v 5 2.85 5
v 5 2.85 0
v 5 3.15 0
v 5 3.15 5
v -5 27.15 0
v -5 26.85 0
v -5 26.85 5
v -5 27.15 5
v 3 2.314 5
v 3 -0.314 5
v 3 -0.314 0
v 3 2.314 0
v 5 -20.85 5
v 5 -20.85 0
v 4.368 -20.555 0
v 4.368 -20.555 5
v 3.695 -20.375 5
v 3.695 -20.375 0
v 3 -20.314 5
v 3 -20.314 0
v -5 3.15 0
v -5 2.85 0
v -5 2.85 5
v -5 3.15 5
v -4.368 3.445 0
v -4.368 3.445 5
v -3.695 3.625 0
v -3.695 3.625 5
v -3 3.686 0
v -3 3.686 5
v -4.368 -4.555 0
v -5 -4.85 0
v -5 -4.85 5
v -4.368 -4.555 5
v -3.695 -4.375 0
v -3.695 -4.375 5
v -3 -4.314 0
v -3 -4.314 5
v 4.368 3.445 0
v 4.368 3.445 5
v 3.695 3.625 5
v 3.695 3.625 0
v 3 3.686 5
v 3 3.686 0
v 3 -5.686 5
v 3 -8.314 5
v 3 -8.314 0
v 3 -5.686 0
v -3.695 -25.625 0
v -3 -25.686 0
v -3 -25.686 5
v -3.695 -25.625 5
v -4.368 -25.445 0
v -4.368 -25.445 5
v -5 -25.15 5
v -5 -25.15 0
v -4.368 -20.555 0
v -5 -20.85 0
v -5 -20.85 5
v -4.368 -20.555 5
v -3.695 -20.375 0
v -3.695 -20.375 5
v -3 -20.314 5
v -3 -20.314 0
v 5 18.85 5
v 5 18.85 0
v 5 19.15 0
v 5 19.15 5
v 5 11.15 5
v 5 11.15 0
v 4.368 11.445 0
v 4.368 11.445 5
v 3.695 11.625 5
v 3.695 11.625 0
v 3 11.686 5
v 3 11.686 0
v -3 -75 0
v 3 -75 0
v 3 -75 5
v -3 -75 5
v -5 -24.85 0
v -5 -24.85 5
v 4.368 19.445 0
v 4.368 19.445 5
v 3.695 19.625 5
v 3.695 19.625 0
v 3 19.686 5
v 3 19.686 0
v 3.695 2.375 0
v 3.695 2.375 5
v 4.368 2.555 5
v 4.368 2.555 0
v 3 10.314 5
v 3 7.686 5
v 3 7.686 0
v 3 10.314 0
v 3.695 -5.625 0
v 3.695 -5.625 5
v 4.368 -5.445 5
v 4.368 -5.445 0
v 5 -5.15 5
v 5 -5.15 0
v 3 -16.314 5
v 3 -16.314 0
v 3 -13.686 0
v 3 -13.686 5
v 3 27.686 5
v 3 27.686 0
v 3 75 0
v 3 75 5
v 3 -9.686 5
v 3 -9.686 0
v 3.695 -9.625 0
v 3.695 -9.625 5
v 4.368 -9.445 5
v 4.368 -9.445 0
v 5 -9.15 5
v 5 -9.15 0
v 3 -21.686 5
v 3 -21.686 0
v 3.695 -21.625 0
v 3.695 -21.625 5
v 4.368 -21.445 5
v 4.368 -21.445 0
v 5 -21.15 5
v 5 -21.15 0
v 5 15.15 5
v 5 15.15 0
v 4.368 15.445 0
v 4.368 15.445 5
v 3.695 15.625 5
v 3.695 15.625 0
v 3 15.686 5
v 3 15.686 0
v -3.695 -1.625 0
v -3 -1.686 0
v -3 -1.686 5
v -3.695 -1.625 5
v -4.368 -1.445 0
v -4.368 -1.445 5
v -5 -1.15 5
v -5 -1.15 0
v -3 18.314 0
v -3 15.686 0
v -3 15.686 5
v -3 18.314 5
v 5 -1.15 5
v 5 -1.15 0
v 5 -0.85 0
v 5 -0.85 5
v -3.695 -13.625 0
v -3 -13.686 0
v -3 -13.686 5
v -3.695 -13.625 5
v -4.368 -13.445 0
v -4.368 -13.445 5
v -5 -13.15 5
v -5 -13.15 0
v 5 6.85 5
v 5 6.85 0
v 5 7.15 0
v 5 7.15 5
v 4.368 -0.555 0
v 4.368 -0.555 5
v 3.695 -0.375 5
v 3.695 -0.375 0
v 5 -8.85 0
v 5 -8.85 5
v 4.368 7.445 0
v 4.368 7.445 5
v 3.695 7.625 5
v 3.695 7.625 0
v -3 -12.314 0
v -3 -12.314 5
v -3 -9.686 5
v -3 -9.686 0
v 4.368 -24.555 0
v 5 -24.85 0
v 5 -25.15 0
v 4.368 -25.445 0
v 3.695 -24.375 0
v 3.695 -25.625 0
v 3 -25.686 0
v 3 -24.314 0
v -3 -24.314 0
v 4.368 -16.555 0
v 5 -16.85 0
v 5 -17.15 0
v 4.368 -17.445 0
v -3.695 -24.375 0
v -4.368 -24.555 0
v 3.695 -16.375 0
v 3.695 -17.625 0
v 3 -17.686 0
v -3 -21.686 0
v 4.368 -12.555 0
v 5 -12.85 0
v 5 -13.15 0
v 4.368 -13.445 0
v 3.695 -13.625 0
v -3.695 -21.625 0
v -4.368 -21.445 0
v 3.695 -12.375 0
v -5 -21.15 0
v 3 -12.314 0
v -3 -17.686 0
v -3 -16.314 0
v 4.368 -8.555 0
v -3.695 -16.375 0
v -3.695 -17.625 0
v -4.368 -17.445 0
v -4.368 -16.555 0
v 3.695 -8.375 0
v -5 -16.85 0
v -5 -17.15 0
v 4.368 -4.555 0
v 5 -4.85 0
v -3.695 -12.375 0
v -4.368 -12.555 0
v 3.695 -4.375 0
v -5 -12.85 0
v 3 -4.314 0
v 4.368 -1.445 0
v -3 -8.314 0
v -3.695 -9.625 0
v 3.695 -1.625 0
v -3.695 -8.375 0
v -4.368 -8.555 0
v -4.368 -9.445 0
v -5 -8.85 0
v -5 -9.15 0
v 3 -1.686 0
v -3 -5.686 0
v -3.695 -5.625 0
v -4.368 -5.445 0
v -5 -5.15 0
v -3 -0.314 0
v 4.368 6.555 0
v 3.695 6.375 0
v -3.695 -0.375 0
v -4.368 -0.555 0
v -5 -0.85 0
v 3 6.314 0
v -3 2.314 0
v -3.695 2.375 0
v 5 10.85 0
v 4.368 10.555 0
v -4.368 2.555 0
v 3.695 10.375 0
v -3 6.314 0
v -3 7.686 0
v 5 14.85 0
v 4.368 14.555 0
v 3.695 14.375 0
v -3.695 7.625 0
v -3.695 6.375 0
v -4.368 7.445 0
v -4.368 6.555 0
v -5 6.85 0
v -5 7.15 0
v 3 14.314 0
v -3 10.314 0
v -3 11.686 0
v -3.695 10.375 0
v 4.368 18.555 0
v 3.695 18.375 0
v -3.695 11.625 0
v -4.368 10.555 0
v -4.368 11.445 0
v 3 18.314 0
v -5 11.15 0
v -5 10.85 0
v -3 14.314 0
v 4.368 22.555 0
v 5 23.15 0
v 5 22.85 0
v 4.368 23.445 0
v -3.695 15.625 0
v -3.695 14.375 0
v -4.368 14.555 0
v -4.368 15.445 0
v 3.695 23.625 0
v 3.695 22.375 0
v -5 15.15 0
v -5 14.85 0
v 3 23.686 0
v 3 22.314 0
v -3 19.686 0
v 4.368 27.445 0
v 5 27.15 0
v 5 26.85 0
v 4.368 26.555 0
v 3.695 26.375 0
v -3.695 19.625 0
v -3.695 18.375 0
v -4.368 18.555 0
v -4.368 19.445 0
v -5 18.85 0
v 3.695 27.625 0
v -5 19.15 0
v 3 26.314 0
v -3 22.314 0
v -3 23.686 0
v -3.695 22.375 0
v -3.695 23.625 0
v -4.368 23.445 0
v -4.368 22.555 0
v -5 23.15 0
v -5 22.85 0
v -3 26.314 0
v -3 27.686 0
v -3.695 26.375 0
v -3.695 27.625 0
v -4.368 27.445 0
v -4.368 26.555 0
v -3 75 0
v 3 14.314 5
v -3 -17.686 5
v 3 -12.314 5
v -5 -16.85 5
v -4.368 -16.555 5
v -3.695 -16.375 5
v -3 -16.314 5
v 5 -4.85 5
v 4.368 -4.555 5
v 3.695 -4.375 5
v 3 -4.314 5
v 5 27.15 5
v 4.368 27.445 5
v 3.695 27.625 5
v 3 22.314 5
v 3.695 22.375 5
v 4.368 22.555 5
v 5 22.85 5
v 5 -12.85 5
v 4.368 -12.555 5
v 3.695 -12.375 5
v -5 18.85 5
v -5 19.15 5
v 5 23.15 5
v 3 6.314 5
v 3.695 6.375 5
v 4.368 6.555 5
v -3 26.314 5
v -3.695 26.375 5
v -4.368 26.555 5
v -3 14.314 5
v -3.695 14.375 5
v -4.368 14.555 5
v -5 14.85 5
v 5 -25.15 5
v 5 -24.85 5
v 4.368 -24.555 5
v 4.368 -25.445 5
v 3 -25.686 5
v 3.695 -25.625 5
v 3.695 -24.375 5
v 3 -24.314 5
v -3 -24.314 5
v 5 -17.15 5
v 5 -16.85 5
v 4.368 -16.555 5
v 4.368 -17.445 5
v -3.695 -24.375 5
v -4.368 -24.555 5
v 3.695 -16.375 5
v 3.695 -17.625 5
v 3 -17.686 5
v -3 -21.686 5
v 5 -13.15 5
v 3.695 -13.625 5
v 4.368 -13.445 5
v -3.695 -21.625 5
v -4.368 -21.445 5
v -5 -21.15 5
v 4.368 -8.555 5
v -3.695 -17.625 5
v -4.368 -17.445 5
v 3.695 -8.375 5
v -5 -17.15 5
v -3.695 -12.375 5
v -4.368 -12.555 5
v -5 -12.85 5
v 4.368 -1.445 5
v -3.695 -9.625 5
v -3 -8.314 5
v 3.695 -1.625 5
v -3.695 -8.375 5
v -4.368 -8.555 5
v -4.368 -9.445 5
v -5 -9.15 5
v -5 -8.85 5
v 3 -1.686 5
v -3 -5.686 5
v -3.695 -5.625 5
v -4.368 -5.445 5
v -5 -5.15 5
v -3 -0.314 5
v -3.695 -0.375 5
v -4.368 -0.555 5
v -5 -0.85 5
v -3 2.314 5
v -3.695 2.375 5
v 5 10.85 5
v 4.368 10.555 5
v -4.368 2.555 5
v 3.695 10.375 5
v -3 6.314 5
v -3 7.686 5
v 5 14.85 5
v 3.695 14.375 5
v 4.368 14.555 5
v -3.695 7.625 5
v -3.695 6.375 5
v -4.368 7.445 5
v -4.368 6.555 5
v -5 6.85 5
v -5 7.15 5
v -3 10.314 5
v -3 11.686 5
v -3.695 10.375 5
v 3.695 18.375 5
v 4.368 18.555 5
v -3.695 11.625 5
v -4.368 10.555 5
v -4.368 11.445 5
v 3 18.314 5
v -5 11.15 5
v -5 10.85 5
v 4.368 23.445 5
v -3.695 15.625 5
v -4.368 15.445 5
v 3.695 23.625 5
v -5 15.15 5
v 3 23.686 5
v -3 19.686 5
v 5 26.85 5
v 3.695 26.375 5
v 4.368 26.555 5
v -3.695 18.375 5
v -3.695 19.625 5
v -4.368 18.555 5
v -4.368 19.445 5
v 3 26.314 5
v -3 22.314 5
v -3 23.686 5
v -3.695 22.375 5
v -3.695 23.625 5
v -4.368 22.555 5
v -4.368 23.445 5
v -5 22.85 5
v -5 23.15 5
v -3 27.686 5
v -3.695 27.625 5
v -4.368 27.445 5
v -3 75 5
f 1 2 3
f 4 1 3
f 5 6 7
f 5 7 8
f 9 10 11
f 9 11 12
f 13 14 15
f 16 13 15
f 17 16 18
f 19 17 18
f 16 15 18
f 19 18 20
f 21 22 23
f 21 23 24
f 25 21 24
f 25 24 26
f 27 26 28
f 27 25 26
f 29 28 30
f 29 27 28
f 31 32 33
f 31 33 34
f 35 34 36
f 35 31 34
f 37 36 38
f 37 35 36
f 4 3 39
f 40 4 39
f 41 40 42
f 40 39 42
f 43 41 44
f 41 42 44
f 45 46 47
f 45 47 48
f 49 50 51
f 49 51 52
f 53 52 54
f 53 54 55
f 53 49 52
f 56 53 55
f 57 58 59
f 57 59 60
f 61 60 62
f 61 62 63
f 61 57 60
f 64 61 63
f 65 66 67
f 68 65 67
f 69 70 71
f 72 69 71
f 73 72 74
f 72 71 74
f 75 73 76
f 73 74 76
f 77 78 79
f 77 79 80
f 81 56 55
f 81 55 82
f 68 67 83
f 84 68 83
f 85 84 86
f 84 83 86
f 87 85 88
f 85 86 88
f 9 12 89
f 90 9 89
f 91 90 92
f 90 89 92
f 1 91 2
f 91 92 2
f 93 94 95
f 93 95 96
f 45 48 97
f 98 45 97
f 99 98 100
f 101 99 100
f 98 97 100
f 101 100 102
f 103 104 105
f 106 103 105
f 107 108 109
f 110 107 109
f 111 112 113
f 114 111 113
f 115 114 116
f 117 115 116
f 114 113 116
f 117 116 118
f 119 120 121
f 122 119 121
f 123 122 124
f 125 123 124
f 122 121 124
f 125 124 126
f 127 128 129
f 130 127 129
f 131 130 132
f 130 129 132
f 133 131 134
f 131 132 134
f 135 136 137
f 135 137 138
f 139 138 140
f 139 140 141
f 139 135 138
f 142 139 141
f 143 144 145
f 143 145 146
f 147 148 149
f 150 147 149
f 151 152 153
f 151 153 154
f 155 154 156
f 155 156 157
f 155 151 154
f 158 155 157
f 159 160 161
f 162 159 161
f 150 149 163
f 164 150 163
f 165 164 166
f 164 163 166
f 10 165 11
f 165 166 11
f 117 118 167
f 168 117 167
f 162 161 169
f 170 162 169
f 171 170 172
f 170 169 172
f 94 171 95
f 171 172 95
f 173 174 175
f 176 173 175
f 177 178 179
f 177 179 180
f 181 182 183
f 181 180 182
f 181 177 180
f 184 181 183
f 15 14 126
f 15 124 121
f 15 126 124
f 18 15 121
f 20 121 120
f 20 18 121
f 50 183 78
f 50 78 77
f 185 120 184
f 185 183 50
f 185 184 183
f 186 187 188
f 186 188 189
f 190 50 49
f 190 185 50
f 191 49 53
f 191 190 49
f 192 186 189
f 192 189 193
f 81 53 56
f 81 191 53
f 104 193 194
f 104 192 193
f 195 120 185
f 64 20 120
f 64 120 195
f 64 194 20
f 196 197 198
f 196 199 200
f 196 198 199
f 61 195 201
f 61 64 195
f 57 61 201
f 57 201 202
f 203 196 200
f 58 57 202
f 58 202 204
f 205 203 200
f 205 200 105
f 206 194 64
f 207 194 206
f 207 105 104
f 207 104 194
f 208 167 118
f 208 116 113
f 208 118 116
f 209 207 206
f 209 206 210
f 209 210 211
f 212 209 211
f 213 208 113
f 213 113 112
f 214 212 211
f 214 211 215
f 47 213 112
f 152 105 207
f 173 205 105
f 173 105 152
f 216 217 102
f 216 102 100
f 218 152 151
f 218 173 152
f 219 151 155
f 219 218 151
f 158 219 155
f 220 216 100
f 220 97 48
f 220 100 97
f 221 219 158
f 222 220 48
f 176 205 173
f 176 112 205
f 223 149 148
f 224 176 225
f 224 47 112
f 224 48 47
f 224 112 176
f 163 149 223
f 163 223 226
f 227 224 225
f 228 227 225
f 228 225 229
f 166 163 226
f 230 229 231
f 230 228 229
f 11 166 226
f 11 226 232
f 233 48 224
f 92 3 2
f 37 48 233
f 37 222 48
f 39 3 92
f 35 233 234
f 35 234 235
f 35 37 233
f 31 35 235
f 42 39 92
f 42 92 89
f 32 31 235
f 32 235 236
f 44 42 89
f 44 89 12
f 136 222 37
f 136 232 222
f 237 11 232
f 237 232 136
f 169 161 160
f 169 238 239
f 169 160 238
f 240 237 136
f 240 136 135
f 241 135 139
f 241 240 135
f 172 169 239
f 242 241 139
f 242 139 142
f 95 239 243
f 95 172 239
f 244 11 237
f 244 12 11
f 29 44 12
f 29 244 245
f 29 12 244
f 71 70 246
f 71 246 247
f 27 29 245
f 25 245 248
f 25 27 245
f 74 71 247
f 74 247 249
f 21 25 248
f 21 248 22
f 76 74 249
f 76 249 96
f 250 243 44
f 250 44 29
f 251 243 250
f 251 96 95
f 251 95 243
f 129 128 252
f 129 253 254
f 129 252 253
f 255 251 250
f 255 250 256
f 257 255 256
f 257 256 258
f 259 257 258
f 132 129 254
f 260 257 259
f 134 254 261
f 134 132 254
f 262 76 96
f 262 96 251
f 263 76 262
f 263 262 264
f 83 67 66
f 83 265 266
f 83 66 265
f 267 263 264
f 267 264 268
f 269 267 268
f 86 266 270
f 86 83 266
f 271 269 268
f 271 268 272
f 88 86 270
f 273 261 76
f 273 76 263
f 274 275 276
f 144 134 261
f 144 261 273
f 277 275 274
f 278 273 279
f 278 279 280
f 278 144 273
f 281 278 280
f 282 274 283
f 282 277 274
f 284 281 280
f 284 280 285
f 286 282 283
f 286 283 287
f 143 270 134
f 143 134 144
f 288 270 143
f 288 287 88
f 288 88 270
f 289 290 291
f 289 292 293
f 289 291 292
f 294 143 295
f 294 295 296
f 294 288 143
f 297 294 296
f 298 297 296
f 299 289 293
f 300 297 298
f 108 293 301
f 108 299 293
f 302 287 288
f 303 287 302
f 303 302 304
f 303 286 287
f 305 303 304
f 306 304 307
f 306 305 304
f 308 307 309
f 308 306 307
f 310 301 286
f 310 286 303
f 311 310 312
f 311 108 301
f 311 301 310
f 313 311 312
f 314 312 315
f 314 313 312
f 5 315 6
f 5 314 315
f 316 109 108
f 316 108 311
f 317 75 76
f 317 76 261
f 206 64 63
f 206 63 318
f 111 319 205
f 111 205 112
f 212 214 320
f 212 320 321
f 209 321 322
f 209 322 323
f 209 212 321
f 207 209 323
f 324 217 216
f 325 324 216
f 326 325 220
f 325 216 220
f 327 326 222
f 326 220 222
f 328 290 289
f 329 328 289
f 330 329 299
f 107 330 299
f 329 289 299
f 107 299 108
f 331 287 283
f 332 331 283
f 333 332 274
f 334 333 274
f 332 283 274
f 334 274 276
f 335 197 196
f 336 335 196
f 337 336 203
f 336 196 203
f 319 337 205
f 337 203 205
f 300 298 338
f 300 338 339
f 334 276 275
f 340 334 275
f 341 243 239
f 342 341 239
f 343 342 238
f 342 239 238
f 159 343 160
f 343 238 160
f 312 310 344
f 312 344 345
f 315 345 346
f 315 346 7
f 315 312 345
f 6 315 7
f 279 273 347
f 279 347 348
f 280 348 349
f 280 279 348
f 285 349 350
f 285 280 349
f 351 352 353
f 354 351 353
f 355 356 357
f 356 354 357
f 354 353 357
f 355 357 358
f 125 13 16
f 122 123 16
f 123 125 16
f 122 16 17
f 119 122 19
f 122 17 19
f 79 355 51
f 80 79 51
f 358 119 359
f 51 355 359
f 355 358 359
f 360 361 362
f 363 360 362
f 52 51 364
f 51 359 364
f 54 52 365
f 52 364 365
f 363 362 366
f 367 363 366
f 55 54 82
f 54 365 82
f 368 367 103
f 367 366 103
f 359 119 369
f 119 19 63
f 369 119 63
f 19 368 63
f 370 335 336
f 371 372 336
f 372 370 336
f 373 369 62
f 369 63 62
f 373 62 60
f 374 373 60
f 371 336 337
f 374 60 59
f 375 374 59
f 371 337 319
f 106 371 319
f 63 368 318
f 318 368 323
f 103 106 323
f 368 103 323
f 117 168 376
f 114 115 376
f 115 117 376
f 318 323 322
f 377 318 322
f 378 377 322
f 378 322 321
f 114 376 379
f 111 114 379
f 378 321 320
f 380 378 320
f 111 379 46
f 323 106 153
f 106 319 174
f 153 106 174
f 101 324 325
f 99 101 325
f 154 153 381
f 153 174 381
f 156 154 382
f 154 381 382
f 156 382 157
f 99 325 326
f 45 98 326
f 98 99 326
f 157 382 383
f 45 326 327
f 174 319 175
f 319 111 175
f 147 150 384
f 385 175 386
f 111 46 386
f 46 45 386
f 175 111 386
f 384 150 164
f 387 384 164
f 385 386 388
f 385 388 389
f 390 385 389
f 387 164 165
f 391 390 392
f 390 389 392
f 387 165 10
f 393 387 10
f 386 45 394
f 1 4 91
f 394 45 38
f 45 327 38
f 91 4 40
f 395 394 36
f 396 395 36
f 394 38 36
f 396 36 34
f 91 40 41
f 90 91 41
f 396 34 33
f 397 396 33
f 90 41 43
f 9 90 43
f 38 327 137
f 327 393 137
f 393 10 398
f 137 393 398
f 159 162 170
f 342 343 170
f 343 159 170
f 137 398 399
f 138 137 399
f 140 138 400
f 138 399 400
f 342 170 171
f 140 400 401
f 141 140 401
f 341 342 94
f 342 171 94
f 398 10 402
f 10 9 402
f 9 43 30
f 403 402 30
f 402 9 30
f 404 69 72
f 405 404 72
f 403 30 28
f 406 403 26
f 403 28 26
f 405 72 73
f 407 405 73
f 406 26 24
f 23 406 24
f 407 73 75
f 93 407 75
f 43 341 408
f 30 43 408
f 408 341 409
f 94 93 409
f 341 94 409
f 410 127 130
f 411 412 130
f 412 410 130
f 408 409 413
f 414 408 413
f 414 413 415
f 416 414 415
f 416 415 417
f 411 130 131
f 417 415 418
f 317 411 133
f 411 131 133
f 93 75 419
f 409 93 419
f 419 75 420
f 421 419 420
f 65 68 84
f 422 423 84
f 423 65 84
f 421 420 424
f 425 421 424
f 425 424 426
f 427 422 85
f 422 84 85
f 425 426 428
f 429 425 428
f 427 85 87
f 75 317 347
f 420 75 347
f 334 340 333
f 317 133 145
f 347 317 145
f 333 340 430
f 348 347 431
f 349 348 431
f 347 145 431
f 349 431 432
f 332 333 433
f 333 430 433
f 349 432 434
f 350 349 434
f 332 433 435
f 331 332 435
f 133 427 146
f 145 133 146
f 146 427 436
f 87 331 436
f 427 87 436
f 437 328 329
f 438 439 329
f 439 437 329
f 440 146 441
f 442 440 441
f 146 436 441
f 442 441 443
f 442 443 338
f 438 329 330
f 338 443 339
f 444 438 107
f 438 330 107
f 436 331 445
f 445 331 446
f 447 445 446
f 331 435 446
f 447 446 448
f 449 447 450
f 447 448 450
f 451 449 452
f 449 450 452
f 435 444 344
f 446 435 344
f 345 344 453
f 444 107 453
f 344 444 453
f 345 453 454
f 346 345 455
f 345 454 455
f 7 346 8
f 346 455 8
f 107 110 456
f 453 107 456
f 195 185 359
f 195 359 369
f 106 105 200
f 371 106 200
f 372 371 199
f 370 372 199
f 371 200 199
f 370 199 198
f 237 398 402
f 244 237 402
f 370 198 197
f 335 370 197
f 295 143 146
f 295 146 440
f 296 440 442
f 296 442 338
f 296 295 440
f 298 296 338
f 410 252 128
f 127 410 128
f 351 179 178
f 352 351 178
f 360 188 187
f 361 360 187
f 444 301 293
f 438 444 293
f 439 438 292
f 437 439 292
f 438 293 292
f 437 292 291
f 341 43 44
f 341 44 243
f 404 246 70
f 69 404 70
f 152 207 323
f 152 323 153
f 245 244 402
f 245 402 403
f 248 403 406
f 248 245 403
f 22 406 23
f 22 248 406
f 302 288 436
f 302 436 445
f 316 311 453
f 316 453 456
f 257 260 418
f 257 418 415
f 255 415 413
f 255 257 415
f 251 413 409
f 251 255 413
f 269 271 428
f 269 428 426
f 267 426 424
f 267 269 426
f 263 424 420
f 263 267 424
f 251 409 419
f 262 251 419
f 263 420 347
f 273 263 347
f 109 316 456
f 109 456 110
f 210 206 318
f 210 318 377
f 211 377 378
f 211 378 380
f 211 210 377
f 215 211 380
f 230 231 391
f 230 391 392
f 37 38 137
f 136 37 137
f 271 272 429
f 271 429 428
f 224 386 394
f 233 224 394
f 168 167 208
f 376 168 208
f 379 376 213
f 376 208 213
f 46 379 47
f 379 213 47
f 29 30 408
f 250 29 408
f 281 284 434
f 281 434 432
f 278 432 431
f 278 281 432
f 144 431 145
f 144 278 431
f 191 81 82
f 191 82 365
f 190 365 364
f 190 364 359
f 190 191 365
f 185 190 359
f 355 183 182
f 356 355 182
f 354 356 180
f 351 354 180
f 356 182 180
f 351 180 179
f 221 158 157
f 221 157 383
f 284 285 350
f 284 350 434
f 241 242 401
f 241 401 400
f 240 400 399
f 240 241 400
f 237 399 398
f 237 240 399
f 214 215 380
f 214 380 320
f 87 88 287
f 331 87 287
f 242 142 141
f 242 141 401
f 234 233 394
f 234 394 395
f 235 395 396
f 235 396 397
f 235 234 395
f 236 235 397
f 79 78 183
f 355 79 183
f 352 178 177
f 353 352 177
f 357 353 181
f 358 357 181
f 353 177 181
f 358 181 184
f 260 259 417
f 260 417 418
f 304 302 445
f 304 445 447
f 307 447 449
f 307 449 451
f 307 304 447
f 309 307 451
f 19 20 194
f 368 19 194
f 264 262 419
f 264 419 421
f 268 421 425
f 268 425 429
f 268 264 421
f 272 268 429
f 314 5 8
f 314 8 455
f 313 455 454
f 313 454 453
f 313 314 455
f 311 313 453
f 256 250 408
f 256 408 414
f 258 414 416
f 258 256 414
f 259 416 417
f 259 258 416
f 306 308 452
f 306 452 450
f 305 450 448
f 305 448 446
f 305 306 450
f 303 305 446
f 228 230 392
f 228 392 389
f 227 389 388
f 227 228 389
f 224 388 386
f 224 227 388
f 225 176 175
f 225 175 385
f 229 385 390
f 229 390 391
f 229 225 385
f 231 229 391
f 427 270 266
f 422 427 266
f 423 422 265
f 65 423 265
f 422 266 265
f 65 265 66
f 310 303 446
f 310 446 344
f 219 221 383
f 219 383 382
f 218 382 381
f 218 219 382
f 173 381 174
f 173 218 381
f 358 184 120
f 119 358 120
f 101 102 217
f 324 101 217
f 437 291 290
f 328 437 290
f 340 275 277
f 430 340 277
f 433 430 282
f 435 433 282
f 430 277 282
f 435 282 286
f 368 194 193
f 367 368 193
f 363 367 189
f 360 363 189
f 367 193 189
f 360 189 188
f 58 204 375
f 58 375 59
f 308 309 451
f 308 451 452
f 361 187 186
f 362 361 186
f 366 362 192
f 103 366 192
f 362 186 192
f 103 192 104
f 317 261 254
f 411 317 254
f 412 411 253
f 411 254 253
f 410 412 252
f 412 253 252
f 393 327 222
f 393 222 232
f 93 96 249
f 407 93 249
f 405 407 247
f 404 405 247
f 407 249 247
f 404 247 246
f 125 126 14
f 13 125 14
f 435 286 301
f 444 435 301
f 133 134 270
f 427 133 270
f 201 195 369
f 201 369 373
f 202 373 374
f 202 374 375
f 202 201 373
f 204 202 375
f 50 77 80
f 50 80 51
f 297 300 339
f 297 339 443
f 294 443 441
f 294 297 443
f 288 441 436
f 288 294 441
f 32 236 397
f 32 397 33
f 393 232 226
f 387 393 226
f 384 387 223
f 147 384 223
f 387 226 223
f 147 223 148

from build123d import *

# Parameters (mm, degrees)
F1_DEPTH = 5


with BuildPart() as f1:
    # F0 (on Top) → F1 (new body)
    with BuildSketch(Plane.XY):
        Polygon((3, 75), (0, 75), (0, -75), (3, -75), (3, -25.685898), (3, -24.314102), (3, -21.685898), (3, -20.314102), (3, -17.685898), (3, -16.314102), (3, -13.685898), (3, -12.314102), (3, -9.685898), (3, -8.314102), (3, -5.685898), (3, -4.314102), (3, -1.685898), (3, -0.314102), (3, 2.314102), (3, 3.685898), (3, 6.314102), (3, 7.685898), (3, 10.314102), (3, 11.685898), (3, 14.314102), (3, 15.685898), (3, 18.314102), (3, 19.685898), (3, 22.314102), (3, 23.685898), (3, 26.314102), (3, 27.685898), align=None)
        with BuildLine():
            ThreePointArc((5, 27.15), (4.035276, 27.549602), (3, 27.685898))
            Line((3, 27.685898), (3, 26.314102))
            ThreePointArc((3, 26.314102), (4.035276, 26.450398), (5, 26.85))
            Line((5, 26.85), (5, 27))
            Line((5, 27), (5, 27.15))
        make_face()
        with BuildLine():
            Line((3, -24.314102), (3, -25.685898))
            ThreePointArc((3, -25.685898), (4.035276, -25.549602), (5, -25.15))
            Line((5, -25.15), (5, -25))
            Line((5, -25), (5, -24.85))
            ThreePointArc((5, -24.85), (4.035276, -24.450398), (3, -24.314102))
        make_face()
        with BuildLine():
            ThreePointArc((5, 23.15), (4.035276, 23.549602), (3, 23.685898))
            Line((3, 23.685898), (3, 22.314102))
            ThreePointArc((3, 22.314102), (4.035276, 22.450398), (5, 22.85))
            Line((5, 22.85), (5, 23))
            Line((5, 23), (5, 23.15))
        make_face()
        with BuildLine():
            Line((3, -20.314102), (3, -21.685898))
            ThreePointArc((3, -21.685898), (4.035276, -21.549602), (5, -21.15))
            Line((5, -21.15), (5, -21))
            Line((5, -21), (5, -20.85))
            ThreePointArc((5, -20.85), (4.035276, -20.450398), (3, -20.314102))
        make_face()
        with BuildLine():
            ThreePointArc((5, 19.15), (4.035276, 19.549602), (3, 19.685898))
            Line((3, 19.685898), (3, 18.314102))
            ThreePointArc((3, 18.314102), (4.035276, 18.450398), (5, 18.85))
            Line((5, 18.85), (5, 19))
            Line((5, 19), (5, 19.15))
        make_face()
        with BuildLine():
            Line((3, -16.314102), (3, -17.685898))
            ThreePointArc((3, -17.685898), (4.035276, -17.549602), (5, -17.15))
            Line((5, -17.15), (5, -17))
            Line((5, -17), (5, -16.85))
            ThreePointArc((5, -16.85), (4.035276, -16.450398), (3, -16.314102))
        make_face()
        with BuildLine():
            ThreePointArc((5, 15.15), (4.035276, 15.549602), (3, 15.685898))
            Line((3, 15.685898), (3, 14.314102))
            ThreePointArc((3, 14.314102), (4.035276, 14.450398), (5, 14.85))
            Line((5, 14.85), (5, 15))
            Line((5, 15), (5, 15.15))
        make_face()
        with BuildLine():
            Line((3, -12.314102), (3, -13.685898))
            ThreePointArc((3, -13.685898), (4.035276, -13.549602), (5, -13.15))
            Line((5, -13.15), (5, -13))
            Line((5, -13), (5, -12.85))
            ThreePointArc((5, -12.85), (4.035276, -12.450398), (3, -12.314102))
        make_face()
        with BuildLine():
            ThreePointArc((5, 11.15), (4.035276, 11.549602), (3, 11.685898))
            Line((3, 11.685898), (3, 10.314102))
            ThreePointArc((3, 10.314102), (4.035276, 10.450398), (5, 10.85))
            Line((5, 10.85), (5, 11))
            Line((5, 11), (5, 11.15))
        make_face()
        with BuildLine():
            Line((3, -8.314102), (3, -9.685898))
            ThreePointArc((3, -9.685898), (4.035276, -9.549602), (5, -9.15))
            Line((5, -9.15), (5, -9))
            Line((5, -9), (5, -8.85))
            ThreePointArc((5, -8.85), (4.035276, -8.450398), (3, -8.314102))
        make_face()
        with BuildLine():
            ThreePointArc((5, 7.15), (4.035276, 7.549602), (3, 7.685898))
            Line((3, 7.685898), (3, 6.314102))
            ThreePointArc((3, 6.314102), (4.035276, 6.450398), (5, 6.85))
            Line((5, 6.85), (5, 7))
            Line((5, 7), (5, 7.15))
        make_face()
        with BuildLine():
            Line((3, -4.314102), (3, -5.685898))
            ThreePointArc((3, -5.685898), (4.035276, -5.549602), (5, -5.15))
            Line((5, -5.15), (5, -5))
            Line((5, -5), (5, -4.85))
            ThreePointArc((5, -4.85), (4.035276, -4.450398), (3, -4.314102))
        make_face()
        with BuildLine():
            ThreePointArc((5, 3.15), (4.035276, 3.549602), (3, 3.685898))
            Line((3, 3.685898), (3, 2.314102))
            ThreePointArc((3, 2.314102), (4.035276, 2.450398), (5, 2.85))
            Line((5, 2.85), (5, 3))
            Line((5, 3), (5, 3.15))
        make_face()
        with BuildLine():
            Line((3, -0.314102), (3, -1.685898))
            ThreePointArc((3, -1.685898), (4.035276, -1.549602), (5, -1.15))
            Line((5, -1.15), (5, -1))
            Line((5, -1), (5, -0.85))
            ThreePointArc((5, -0.85), (4.035276, -0.450398), (3, -0.314102))
        make_face()
    extrude(amount=F1_DEPTH)

    # F2: F1 across face


with BuildPart() as f1_1:
    add(f1.part)
    add(f1.part.mirror(Plane(origin=(0, 0, 2.5), x_dir=(0, -1, 0), z_dir=(-1, 0, 0))))


solid = f1_1.part
